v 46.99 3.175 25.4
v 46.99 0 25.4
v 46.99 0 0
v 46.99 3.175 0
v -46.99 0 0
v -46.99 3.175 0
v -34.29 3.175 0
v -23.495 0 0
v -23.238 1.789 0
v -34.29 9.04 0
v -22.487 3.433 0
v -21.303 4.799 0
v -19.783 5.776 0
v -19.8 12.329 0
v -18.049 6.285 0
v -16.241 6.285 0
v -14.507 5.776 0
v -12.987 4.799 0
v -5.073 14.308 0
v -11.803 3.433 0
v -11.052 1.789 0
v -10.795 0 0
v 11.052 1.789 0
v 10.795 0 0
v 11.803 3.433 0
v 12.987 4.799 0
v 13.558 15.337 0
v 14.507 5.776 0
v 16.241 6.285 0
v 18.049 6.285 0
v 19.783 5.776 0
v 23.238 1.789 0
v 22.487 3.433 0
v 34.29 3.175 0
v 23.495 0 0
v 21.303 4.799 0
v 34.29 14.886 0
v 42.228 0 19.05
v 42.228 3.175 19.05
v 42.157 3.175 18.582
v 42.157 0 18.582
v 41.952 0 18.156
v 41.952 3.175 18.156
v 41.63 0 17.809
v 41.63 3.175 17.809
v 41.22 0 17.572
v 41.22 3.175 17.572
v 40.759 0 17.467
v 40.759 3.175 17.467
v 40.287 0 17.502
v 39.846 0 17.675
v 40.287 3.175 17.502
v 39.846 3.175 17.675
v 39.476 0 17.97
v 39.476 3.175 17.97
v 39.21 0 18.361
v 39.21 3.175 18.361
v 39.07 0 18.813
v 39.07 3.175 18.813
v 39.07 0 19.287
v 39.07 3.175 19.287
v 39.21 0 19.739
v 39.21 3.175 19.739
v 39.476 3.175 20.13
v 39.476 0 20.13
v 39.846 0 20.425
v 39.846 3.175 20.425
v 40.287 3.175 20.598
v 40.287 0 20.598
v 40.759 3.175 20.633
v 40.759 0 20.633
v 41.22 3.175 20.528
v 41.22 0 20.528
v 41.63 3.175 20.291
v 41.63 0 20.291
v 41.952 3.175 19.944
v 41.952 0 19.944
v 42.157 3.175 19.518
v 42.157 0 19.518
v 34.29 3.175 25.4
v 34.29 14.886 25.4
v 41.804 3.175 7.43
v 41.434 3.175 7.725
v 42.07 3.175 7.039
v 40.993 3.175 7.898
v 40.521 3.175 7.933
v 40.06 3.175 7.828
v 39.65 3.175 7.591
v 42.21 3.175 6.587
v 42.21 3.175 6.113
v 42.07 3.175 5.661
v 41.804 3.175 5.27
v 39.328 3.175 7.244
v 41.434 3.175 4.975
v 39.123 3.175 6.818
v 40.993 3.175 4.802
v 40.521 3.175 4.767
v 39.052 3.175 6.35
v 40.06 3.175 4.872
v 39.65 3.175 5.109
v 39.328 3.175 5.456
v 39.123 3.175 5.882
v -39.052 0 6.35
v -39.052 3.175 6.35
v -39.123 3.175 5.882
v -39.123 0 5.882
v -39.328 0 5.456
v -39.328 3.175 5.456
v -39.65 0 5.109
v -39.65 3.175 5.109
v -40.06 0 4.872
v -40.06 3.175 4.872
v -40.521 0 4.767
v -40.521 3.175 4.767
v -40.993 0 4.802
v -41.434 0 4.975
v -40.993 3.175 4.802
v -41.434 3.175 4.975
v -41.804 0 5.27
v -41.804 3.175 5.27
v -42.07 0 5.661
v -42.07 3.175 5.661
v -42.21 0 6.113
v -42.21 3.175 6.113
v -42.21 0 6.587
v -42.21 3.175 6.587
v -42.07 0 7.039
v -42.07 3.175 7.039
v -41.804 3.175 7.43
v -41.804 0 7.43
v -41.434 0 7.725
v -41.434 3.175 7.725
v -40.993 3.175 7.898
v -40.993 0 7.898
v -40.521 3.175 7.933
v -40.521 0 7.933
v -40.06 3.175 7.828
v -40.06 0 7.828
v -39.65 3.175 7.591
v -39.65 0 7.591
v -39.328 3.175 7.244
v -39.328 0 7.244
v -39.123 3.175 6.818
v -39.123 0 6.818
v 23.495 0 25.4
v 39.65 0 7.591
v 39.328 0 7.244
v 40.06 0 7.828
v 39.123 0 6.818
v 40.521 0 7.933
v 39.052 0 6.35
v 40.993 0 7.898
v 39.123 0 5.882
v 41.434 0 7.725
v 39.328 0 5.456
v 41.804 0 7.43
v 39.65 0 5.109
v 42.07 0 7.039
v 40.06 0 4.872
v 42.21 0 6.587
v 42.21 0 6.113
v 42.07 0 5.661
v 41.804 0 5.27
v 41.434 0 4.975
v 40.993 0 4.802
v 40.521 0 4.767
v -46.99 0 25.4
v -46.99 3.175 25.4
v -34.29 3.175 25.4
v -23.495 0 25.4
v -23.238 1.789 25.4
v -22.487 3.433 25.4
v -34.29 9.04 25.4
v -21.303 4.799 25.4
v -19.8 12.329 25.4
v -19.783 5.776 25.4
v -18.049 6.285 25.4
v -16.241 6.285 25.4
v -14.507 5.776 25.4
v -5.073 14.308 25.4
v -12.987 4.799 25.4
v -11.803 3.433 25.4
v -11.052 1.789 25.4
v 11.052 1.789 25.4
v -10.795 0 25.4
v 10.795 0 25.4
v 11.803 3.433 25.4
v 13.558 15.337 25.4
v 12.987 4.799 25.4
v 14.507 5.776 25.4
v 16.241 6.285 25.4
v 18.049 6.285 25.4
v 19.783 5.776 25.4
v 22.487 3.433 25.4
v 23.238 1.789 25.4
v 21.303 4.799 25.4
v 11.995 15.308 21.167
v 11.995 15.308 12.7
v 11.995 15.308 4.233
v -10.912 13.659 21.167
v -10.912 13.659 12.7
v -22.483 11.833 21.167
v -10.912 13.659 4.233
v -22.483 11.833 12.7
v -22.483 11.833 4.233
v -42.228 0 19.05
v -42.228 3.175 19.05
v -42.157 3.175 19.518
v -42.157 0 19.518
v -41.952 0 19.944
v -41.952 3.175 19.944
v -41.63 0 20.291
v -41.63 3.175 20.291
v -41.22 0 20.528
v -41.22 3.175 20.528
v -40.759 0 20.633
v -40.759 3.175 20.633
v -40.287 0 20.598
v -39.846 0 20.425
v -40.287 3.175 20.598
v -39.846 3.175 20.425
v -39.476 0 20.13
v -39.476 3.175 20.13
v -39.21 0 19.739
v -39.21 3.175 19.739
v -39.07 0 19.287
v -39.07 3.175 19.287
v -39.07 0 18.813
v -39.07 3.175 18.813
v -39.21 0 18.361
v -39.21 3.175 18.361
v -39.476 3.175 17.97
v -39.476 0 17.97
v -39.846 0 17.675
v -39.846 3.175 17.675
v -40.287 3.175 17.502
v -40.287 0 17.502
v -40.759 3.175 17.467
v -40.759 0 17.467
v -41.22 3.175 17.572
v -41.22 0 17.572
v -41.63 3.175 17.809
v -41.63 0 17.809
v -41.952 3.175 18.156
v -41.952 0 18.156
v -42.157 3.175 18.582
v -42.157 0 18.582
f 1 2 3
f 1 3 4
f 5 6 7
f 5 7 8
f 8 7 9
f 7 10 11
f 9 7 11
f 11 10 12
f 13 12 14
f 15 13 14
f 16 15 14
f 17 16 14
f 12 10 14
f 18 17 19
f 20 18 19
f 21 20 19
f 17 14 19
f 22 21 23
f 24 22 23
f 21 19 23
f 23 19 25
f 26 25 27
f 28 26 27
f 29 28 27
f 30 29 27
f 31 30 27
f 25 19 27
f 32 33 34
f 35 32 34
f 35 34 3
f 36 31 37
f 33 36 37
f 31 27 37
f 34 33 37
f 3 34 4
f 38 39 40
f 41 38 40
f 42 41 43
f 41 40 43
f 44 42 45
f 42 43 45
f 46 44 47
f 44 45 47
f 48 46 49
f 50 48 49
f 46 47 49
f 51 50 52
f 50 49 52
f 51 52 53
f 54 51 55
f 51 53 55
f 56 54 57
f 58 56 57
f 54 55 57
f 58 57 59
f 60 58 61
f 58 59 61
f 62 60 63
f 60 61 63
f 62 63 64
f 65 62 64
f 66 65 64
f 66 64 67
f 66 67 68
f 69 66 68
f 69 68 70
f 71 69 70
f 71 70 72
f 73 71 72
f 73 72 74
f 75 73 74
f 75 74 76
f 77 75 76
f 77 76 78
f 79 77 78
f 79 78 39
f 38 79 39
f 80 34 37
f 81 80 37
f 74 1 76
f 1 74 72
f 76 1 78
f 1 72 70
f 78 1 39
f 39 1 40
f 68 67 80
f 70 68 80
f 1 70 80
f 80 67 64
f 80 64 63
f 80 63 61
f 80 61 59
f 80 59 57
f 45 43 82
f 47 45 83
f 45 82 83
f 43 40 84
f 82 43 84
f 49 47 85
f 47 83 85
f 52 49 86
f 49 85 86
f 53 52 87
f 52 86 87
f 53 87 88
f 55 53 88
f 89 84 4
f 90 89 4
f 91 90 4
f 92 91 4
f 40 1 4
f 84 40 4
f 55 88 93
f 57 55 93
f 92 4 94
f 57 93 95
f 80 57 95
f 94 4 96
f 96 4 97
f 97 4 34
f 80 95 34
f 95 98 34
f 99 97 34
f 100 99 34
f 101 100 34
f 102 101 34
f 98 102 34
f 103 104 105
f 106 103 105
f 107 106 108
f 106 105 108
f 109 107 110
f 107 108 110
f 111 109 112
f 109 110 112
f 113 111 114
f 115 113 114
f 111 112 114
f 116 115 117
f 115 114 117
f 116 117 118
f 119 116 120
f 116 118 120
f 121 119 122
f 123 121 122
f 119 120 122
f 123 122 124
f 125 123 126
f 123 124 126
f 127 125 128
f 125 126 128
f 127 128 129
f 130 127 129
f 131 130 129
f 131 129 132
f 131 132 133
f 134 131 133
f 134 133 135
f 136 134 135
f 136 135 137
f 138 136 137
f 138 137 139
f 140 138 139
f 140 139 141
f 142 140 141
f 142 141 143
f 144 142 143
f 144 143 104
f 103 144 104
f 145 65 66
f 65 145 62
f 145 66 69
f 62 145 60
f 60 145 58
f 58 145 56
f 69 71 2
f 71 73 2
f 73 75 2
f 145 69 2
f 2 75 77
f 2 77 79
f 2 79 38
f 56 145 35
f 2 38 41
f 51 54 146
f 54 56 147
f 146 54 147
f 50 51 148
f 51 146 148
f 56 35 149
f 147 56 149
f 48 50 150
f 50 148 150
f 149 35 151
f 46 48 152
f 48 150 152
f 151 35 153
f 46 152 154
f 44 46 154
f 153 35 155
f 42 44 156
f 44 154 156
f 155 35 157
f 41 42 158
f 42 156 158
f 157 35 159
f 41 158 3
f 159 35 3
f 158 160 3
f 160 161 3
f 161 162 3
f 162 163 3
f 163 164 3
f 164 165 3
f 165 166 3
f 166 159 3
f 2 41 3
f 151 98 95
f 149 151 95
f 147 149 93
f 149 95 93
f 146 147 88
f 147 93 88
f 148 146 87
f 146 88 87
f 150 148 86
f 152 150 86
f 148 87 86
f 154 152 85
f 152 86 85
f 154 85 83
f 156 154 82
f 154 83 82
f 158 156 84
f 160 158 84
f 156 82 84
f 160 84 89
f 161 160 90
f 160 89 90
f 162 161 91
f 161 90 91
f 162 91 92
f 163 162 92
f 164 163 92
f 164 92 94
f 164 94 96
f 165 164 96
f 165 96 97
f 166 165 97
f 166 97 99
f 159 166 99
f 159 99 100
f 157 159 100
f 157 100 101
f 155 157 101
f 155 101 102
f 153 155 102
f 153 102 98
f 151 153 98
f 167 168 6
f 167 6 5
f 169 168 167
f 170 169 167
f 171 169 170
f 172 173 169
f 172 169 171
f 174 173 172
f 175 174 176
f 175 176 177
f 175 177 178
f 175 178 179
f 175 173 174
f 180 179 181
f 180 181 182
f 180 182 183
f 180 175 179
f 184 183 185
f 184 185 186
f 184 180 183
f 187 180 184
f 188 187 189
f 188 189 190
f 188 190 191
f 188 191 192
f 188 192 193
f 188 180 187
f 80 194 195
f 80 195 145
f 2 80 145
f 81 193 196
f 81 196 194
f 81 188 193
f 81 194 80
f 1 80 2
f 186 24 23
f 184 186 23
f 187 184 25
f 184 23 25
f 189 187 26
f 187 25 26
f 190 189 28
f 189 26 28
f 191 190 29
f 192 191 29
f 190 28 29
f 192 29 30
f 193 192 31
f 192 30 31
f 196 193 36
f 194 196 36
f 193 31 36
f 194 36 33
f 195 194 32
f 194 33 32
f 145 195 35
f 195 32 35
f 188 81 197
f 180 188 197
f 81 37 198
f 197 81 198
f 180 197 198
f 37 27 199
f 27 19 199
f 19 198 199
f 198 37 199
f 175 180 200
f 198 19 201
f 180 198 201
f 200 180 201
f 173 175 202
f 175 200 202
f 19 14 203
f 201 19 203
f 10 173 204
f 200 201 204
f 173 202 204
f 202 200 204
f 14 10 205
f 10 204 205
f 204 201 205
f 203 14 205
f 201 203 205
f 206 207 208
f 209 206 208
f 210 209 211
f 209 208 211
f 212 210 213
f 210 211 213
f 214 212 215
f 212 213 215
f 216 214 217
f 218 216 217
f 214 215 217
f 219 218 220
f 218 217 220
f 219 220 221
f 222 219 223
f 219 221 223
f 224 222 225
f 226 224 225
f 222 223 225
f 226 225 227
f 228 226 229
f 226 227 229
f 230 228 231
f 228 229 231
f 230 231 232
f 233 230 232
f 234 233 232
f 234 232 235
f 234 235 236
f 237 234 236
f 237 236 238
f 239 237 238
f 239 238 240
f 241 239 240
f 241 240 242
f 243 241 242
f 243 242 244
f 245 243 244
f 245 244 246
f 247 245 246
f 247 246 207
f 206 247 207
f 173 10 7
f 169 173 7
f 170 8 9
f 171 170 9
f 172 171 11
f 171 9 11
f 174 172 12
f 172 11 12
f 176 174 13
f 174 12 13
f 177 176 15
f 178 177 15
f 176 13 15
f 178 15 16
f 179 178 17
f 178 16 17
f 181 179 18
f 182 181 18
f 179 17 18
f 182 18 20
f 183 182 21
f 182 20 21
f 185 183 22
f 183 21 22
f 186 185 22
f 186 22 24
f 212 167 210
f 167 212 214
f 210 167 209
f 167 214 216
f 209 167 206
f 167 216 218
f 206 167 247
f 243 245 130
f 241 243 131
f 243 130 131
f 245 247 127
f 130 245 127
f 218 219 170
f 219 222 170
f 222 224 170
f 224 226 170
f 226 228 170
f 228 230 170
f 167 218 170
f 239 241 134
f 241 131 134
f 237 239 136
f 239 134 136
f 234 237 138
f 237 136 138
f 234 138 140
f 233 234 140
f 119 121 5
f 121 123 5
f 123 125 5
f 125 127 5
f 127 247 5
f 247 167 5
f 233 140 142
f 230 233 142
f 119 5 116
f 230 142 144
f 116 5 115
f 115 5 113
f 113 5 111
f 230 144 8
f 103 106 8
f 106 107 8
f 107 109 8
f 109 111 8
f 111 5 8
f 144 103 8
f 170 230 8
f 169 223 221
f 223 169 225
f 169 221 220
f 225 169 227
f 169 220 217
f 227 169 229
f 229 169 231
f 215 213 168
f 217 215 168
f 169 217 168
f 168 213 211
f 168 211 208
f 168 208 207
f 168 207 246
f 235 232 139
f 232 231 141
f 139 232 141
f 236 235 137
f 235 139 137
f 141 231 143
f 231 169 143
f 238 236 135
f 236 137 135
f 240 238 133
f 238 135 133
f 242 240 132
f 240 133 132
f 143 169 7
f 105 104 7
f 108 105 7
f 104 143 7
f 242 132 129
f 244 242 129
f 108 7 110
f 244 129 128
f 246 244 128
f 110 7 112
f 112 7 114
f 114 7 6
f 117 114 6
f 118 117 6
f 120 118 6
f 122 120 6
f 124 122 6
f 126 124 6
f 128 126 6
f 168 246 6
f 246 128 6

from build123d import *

# Parameters (mm, degrees)
BOSS_EXTRUDE1_DEPTH = 25.4
SKETCH2_R           = 1.5875
CUT_EXTRUDE1_DEPTH  = 55.904554456
SPLIT1_DEPTH        = 25.4
SPLIT1_2_DEPTH      = 25.4


# Read off the part's stored shape, not the designer's step: Split1
with BuildPart() as part:
    # Sketch1 → Boss-Extrude1 (new body)
    with BuildSketch(Plane.XY):
        with BuildLine():
            Line((-10.795, 0), (10.795, 0))
            ThreePointArc((10.795, 0), (17.145, 6.35), (23.495, 0))
            Line((23.495, 0), (46.99, 0))
            Line((46.99, 0), (46.99, 3.175))
            Line((46.99, 3.175), (34.29, 3.175))
            Line((34.29, 3.175), (34.29, 15.875))
            Line((34.29, 15.875), (-34.29, 15.875))
            Line((-34.29, 15.875), (-34.29, 3.175))
            Line((-34.29, 3.175), (-46.99, 3.175))
            Line((-46.99, 3.175), (-46.99, 0))
            Line((-46.99, 0), (-23.495, 0))
            ThreePointArc((-23.495, 0), (-17.145, 6.35), (-10.795, 0))
        make_face()
    extrude(amount=BOSS_EXTRUDE1_DEPTH)

    # Sketch2 → Cut-Extrude1 (cut, through all)
    with BuildSketch(Plane(origin=(0, 3.175, 0), x_dir=(1, 0, 0), z_dir=(0, 1, 0))):
        with Locations(Location((40.64, -6.35, 0), (0, 0, 180))):
            Circle(SKETCH2_R)
        with Locations((40.64, -19.05)):
            Circle(SKETCH2_R)
        with Locations((-40.64, -6.35)):
            Circle(SKETCH2_R)
        with Locations(Location((-40.64, -19.05, 0), (0, 0, 180))):
            Circle(SKETCH2_R)
    extrude(amount=-CUT_EXTRUDE1_DEPTH, mode=Mode.SUBTRACT)

    # Split1 outline → Split1 (cut)
    with BuildSketch(Plane.XY):
        with BuildLine():
            add(Edge.make_bspline(
                [(34.29, 14.886313468), (26.866291946, 15.29633498), (15.604034158, 15.560800445), (0.522525145, 14.87798763), (-10.958660885, 13.761745583), (-22.480305747, 11.986676774), (-30.226096065, 10.175274204), (-34.155574129, 9.077862689), (-34.29, 9.040099193)],
                knots=[0.298916779, 0.298916779, 0.298916779, 0.298916779, 0.346600594, 0.371102737, 0.395726297, 0.420570145, 0.445825119, 0.446720069, 0.446720069, 0.446720069, 0.446720069], degree=3))
            Line((34.29, 14.886313468), (34.29, 15.875))
            Line((34.29, 15.875), (-34.29, 15.875))
            Line((-34.29, 15.875), (-34.29, 9.040099193))
        make_face()
    extrude(amount=SPLIT1_DEPTH, mode=Mode.SUBTRACT)


with BuildPart() as body_2:
    # Split1 2 outline → Split1 2 (new body)
    with BuildSketch(Plane.XY):
        with BuildLine():
            add(Edge.make_bspline(
                [(34.29, 14.886313468), (26.866291946, 15.29633498), (15.604034158, 15.560800445), (0.522525145, 14.87798763), (-10.958660885, 13.761745583), (-22.480305747, 11.986676774), (-30.226096065, 10.175274204), (-34.155574129, 9.077862689), (-34.29, 9.040099193)],
                knots=[0.298916779, 0.298916779, 0.298916779, 0.298916779, 0.346600594, 0.371102737, 0.395726297, 0.420570145, 0.445825119, 0.446720069, 0.446720069, 0.446720069, 0.446720069], degree=3))
            Line((34.29, 14.886313468), (34.29, 15.875))
            Line((34.29, 15.875), (-34.29, 15.875))
            Line((-34.29, 15.875), (-34.29, 9.040099193))
        make_face()
    extrude(amount=SPLIT1_2_DEPTH)


solid = part.part
